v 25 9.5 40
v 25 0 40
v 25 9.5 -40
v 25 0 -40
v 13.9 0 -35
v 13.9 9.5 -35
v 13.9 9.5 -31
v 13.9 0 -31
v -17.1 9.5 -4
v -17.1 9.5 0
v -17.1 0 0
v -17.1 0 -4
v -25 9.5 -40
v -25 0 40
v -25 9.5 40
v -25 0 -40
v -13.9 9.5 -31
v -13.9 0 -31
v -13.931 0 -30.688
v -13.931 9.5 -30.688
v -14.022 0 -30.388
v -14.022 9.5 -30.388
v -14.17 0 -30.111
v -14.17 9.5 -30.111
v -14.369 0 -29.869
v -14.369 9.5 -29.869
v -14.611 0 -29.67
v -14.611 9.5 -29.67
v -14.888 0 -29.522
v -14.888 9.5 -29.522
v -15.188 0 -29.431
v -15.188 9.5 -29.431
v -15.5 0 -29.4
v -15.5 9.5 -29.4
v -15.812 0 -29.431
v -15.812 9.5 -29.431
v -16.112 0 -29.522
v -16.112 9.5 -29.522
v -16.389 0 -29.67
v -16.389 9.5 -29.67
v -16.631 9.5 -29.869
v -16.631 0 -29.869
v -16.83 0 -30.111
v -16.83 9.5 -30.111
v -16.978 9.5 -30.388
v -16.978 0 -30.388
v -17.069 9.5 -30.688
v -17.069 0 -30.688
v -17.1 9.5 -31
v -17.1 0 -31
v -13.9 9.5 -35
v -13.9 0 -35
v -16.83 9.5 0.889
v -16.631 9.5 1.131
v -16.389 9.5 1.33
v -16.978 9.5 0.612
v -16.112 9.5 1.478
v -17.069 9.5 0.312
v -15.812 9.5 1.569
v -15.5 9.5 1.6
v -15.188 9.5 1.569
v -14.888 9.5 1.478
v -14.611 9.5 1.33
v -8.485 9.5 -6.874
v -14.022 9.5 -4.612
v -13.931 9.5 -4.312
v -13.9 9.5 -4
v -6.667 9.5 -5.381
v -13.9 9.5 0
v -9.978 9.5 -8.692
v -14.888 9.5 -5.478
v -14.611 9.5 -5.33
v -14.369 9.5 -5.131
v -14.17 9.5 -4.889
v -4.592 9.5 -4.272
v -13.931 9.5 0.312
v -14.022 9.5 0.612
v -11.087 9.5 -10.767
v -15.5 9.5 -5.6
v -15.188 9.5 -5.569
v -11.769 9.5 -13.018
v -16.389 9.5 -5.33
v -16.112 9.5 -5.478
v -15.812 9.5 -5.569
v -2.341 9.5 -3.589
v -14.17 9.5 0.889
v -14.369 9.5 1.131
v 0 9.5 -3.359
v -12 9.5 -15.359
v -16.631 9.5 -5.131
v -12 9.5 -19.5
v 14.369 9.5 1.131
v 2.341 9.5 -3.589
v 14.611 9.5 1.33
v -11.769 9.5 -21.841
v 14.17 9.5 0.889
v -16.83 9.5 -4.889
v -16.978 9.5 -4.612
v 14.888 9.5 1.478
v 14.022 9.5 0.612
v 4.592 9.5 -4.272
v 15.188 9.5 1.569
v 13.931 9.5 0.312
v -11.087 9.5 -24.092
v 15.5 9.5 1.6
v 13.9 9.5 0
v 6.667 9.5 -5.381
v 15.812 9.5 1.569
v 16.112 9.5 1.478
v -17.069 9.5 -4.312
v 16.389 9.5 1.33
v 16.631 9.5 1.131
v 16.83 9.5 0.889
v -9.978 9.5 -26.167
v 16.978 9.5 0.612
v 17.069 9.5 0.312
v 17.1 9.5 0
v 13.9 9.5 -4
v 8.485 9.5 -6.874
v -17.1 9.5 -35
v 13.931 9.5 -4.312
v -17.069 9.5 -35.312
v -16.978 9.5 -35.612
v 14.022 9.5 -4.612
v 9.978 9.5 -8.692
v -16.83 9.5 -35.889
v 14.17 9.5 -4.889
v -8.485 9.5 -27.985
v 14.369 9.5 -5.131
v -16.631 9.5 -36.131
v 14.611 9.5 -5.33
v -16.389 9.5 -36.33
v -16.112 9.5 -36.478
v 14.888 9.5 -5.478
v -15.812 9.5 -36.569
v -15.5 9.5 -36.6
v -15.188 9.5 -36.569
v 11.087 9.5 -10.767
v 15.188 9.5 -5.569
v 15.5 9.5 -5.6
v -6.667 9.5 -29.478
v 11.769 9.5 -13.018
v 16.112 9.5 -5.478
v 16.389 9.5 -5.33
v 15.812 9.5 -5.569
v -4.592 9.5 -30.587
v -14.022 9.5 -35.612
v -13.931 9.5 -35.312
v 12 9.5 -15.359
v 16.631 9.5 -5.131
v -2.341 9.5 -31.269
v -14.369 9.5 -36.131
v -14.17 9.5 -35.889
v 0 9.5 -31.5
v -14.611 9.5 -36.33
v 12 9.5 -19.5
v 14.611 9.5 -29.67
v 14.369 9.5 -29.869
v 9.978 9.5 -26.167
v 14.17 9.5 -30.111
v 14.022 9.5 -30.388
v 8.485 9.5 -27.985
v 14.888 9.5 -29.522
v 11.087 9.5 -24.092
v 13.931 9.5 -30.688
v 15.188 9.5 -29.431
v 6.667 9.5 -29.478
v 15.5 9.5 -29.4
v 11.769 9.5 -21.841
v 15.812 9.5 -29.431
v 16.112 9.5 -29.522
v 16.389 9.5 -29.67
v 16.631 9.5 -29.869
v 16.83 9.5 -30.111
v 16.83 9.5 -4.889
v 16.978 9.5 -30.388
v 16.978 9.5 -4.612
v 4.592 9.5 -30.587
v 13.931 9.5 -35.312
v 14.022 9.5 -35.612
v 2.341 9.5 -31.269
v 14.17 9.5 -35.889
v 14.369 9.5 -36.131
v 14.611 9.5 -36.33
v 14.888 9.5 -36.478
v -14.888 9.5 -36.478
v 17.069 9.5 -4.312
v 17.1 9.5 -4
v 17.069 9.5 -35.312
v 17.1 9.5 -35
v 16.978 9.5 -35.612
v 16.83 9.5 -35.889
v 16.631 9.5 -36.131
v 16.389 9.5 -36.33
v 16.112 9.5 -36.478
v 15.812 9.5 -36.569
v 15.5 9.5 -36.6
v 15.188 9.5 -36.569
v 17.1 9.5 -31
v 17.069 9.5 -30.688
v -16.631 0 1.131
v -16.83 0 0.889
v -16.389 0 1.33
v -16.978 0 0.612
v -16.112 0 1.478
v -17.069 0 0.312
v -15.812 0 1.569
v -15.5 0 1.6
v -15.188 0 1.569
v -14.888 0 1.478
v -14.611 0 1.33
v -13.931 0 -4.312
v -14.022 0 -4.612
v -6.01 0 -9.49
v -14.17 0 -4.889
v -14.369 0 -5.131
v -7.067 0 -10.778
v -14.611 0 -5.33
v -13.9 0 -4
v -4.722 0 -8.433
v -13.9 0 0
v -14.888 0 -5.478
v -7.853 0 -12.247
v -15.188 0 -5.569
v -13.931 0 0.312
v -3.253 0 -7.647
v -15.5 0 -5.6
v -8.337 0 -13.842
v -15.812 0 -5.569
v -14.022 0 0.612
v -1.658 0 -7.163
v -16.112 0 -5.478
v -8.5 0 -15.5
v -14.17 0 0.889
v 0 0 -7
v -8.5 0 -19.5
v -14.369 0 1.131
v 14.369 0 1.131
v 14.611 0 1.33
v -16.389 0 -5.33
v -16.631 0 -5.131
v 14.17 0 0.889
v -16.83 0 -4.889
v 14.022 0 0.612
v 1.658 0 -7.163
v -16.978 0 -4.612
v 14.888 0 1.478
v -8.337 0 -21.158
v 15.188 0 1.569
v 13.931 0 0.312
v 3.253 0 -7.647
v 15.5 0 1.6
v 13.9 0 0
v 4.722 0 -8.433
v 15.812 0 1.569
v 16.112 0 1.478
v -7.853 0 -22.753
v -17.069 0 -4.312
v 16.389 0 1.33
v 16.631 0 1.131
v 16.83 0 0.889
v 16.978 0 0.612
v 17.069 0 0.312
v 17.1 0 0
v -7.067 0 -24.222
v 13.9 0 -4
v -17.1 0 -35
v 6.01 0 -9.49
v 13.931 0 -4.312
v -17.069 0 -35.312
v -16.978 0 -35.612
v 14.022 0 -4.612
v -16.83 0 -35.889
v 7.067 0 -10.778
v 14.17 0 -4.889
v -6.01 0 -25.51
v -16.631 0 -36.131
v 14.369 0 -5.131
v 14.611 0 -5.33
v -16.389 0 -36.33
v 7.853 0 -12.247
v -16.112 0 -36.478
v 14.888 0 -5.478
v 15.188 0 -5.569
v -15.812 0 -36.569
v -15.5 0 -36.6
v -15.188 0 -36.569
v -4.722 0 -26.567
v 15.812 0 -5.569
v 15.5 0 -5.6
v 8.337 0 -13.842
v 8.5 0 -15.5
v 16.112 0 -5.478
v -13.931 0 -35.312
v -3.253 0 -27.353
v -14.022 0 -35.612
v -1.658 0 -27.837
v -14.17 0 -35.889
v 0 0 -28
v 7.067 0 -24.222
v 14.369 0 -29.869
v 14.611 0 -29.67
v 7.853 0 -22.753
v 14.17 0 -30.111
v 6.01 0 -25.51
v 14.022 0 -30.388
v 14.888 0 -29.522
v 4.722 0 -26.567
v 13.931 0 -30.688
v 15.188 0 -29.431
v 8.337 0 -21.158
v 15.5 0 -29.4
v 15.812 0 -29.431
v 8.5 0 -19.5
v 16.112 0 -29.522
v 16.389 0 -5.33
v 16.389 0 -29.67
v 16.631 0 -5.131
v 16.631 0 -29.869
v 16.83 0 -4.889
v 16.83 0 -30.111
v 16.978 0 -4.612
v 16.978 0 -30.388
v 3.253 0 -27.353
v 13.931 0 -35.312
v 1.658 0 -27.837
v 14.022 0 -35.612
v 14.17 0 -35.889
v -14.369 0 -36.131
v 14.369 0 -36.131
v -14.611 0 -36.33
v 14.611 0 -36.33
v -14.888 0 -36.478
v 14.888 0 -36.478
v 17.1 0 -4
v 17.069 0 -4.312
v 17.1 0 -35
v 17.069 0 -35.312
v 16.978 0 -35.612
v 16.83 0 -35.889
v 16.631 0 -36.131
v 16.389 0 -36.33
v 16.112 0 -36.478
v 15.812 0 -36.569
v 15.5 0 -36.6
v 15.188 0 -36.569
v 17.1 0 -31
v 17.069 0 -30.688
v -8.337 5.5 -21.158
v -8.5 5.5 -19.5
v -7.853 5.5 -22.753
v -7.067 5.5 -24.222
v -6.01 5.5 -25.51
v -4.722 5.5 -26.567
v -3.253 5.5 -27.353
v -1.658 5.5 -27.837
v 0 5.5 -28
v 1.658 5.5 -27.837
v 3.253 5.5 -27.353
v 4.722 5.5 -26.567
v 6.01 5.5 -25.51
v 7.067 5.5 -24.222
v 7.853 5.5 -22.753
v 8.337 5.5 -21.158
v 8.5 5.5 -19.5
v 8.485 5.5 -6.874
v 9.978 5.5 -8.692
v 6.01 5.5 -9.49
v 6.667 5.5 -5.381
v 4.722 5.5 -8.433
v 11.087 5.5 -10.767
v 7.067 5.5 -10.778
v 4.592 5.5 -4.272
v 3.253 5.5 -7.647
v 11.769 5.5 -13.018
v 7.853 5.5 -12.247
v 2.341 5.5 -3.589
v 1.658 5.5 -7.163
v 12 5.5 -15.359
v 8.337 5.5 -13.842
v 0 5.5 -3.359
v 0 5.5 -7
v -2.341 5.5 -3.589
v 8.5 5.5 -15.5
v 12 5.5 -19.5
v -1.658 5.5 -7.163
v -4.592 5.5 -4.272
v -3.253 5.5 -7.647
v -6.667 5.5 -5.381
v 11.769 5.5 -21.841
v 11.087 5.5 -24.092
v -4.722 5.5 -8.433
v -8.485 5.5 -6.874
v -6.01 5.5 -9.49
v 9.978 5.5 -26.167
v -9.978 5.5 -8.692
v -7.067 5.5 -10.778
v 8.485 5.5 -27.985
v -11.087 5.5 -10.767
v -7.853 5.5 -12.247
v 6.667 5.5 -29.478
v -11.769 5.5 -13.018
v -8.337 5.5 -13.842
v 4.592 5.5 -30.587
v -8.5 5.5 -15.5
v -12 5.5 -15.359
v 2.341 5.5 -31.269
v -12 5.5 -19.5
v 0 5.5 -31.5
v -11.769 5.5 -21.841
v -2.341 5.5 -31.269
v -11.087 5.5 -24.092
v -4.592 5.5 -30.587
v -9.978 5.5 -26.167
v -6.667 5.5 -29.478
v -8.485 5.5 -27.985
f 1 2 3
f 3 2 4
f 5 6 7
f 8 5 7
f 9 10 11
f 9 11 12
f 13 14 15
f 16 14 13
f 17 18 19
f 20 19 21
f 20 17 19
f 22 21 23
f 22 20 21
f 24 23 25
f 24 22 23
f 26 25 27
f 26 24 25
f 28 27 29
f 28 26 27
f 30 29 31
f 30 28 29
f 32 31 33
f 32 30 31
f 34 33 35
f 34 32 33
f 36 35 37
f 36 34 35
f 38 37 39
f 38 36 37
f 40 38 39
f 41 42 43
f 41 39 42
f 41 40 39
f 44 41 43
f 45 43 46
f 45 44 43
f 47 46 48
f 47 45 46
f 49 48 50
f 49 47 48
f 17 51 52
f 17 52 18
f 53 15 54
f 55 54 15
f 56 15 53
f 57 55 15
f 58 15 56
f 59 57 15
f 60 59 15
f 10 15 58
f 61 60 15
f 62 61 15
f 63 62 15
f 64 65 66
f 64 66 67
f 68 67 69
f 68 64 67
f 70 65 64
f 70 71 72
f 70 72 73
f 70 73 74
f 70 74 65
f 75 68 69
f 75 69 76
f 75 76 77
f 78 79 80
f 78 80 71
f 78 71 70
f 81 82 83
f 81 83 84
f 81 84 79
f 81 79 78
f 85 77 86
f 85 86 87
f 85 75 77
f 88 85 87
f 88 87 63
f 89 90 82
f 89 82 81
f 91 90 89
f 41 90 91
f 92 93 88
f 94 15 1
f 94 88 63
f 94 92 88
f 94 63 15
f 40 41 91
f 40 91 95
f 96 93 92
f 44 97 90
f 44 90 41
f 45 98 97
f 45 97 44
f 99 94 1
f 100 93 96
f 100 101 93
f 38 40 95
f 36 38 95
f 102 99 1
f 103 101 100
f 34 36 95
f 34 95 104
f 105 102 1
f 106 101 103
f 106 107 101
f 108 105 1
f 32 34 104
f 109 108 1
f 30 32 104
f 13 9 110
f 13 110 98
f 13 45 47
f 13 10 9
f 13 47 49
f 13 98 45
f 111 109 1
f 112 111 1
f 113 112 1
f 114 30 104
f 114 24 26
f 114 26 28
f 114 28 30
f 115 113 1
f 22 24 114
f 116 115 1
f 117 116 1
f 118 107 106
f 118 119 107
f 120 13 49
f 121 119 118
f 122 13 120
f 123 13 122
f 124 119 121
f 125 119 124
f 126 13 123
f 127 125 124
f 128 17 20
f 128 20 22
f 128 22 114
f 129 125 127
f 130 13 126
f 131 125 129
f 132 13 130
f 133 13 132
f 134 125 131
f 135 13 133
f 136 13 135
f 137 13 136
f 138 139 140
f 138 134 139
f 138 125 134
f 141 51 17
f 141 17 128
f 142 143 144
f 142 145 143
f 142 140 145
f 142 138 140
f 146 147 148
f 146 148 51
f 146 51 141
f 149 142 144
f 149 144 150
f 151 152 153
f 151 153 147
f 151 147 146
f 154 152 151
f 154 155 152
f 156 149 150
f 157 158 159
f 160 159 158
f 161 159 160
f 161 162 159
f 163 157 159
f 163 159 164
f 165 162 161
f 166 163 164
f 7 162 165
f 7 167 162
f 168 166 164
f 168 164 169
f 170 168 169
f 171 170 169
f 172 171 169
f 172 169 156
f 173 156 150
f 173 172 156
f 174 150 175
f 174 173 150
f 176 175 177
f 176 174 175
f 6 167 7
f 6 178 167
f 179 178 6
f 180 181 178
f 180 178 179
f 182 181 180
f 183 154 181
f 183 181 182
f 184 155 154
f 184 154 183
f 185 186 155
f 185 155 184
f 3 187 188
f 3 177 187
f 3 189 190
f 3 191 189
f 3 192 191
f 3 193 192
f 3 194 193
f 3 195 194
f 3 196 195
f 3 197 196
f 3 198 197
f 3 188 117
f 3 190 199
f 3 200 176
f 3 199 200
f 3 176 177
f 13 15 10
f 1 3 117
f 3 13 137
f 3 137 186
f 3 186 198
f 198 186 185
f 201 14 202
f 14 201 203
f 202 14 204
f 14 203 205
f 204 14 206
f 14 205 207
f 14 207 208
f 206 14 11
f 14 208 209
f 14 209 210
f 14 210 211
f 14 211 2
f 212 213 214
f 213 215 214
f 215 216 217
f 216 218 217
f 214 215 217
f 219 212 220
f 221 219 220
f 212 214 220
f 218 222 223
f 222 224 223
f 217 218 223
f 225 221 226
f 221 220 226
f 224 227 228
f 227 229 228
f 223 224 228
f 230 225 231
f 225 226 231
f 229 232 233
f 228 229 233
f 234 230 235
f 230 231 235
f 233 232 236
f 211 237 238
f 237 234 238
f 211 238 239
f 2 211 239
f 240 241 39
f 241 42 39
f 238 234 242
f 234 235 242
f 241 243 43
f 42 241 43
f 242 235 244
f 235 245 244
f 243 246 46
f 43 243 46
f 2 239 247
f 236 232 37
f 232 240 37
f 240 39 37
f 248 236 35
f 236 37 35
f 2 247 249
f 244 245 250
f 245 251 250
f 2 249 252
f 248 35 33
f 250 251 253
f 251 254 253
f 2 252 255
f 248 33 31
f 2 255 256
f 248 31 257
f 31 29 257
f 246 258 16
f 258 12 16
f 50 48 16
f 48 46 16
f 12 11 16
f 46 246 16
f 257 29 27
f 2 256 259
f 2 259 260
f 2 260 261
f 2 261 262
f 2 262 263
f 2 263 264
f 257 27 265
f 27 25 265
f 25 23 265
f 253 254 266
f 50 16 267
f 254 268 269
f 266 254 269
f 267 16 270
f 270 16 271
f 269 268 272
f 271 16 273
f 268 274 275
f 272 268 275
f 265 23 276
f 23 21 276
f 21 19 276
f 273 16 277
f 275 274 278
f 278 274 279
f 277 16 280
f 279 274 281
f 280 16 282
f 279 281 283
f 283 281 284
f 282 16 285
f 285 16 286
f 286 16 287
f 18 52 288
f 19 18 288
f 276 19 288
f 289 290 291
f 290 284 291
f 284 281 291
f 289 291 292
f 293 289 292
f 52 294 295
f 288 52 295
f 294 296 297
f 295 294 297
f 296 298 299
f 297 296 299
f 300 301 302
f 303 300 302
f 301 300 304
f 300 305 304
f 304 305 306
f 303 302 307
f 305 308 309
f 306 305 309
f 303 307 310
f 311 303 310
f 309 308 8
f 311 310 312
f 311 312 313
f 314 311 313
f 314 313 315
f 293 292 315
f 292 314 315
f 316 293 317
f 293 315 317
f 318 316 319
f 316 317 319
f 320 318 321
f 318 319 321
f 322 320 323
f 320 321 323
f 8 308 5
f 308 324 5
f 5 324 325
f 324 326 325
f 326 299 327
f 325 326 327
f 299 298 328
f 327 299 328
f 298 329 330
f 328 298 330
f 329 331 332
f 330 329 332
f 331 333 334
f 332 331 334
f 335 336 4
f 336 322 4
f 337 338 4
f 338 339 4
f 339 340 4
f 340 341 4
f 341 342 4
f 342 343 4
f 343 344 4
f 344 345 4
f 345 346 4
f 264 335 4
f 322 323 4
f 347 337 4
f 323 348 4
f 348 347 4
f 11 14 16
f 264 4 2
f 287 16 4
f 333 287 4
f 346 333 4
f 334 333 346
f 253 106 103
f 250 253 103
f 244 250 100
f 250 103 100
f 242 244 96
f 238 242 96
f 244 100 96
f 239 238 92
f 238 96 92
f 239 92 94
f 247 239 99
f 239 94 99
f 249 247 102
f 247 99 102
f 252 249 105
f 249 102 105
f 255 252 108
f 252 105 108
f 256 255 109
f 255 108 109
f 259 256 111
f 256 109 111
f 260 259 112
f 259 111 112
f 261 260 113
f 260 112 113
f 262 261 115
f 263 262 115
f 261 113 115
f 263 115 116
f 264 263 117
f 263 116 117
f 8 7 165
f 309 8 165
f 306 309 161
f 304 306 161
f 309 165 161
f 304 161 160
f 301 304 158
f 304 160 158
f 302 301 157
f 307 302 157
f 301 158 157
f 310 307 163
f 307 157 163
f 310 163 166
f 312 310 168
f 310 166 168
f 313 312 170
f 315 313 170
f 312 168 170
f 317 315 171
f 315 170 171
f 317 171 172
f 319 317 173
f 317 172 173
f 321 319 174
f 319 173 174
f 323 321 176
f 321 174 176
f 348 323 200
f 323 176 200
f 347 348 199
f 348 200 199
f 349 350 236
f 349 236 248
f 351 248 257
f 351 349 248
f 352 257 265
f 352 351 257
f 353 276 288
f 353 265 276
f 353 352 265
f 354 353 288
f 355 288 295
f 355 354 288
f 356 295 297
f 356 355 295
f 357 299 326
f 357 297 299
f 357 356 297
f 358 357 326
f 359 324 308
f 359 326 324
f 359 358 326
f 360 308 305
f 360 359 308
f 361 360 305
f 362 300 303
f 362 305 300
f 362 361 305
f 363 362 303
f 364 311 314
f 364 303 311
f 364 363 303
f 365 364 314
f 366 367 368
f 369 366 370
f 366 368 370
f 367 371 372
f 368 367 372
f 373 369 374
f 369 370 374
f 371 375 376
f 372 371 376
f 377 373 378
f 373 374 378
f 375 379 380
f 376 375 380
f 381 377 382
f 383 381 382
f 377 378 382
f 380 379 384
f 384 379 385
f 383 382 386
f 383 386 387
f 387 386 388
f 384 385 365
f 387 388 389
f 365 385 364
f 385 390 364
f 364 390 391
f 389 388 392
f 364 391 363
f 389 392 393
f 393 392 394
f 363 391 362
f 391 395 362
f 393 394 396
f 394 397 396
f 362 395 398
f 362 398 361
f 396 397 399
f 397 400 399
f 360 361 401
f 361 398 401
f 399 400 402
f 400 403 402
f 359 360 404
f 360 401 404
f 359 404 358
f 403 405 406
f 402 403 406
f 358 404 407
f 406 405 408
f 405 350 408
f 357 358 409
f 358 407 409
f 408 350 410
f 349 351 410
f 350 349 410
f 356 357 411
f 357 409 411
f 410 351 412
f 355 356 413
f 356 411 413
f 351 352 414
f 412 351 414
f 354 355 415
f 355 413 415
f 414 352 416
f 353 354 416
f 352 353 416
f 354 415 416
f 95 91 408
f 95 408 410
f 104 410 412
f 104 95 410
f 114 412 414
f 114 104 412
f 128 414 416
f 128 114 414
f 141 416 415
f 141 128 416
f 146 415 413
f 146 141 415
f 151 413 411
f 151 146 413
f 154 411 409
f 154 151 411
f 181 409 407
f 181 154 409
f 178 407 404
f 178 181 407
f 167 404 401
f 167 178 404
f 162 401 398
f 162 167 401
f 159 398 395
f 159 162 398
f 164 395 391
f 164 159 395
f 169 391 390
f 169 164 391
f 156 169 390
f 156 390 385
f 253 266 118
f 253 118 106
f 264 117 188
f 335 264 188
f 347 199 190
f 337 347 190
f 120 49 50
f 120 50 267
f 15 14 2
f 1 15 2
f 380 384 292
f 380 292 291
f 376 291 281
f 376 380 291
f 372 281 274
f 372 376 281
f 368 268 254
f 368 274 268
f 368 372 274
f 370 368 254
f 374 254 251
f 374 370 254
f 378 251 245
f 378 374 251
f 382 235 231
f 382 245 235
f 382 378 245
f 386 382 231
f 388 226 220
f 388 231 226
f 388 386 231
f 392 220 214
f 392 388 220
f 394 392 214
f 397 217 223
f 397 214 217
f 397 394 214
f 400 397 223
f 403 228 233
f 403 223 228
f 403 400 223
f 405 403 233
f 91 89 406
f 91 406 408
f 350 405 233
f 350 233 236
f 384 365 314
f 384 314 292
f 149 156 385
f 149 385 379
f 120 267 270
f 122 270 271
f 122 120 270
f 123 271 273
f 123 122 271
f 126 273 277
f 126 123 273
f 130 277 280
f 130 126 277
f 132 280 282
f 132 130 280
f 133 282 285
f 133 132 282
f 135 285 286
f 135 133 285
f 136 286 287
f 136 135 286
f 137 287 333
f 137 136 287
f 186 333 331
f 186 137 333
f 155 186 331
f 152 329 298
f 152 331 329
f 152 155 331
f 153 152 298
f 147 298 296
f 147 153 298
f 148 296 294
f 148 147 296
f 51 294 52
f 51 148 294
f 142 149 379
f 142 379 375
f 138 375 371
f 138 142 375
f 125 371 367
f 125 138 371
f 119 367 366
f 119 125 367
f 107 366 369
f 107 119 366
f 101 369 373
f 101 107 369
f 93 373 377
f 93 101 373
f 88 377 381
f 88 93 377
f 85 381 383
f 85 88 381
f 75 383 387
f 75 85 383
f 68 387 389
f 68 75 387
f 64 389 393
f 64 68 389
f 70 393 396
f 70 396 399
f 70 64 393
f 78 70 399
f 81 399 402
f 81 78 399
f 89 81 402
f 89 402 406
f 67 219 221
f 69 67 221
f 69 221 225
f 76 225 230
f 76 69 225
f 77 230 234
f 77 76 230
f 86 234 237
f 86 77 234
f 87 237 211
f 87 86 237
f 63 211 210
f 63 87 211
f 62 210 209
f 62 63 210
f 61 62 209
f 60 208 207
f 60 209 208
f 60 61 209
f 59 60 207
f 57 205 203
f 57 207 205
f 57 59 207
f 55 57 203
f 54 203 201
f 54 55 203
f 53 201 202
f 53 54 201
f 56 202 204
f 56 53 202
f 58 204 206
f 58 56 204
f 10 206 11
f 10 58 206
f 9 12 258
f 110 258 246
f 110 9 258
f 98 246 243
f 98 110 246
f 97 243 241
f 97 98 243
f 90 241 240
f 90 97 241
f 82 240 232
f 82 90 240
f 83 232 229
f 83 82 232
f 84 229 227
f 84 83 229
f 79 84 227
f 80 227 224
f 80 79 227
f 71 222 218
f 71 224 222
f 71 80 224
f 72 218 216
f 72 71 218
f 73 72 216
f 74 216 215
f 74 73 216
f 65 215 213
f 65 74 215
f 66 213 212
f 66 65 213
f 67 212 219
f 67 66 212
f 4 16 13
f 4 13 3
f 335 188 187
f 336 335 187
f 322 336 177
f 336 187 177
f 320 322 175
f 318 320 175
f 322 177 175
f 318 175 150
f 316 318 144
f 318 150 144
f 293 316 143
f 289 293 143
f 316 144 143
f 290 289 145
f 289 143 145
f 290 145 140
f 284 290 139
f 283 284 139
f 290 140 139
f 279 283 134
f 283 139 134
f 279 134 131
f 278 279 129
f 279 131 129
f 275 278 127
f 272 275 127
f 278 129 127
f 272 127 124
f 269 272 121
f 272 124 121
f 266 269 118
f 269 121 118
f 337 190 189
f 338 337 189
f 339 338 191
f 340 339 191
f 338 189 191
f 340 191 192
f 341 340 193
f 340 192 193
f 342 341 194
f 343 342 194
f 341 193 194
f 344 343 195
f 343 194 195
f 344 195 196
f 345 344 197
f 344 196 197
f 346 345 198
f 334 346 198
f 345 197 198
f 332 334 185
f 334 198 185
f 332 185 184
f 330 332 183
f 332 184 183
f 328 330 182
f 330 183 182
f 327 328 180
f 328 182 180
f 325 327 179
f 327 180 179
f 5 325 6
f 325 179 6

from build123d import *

# Parameters (mm, degrees)
SKETCH1_W           = 50
SKETCH1_H           = 80
BOSS_EXTRUDE1_DEPTH = 9.5
CUT_EXTRUDE1_DEPTH  = 10.5
CUT_EXTRUDE2_DEPTH  = 4


with BuildPart() as part:
    # Sketch1 → Boss-Extrude1 (new body)
    with BuildSketch(Plane(origin=(0, 0, 0), x_dir=(1, 0, 0), z_dir=(0, 1, 0))):
        Rectangle(SKETCH1_W, SKETCH1_H)
    extrude(amount=BOSS_EXTRUDE1_DEPTH)

    # Sketch2 → Cut-Extrude1 (cut, through all)
    with BuildSketch(Plane(origin=(0, 9.5, 0), x_dir=(1, 0, 0), z_dir=(0, 1, 0))):
        with BuildLine():
            Line((-13.9, 35), (-13.9, 31))
            ThreePointArc((-13.9, 31), (-15.5, 29.4), (-17.1, 31))
            Line((-17.1, 31), (-17.1, 35))
            ThreePointArc((-17.1, 35), (-15.5, 36.6), (-13.9, 35))
        make_face()
        with BuildLine():
            Line((13.9, 35), (13.9, 31))
            ThreePointArc((13.9, 31), (15.5, 29.4), (17.1, 31))
            Line((17.1, 31), (17.1, 35))
            ThreePointArc((17.1, 35), (15.5, 36.6), (13.9, 35))
        make_face()
        with BuildLine():
            Line((-13.9, 4), (-13.9, 0))
            ThreePointArc((-13.9, 0), (-15.5, -1.6), (-17.1, 0))
            Line((-17.1, 0), (-17.1, 4))
            ThreePointArc((-17.1, 4), (-15.5, 5.6), (-13.9, 4))
        make_face()
        with BuildLine():
            Line((13.9, 4), (13.9, 0))
            ThreePointArc((13.9, 0), (15.5, -1.6), (17.1, 0))
            Line((17.1, 0), (17.1, 4))
            ThreePointArc((17.1, 4), (15.5, 5.6), (13.9, 4))
        make_face()
        with BuildLine():
            Line((8.5, 19.5), (8.5, 15.5))
            ThreePointArc((8.5, 15.5), (0, 7), (-8.5, 15.5))
            Line((-8.5, 15.5), (-8.5, 19.5))
            ThreePointArc((-8.5, 19.5), (0, 28), (8.5, 19.5))
        make_face()
    extrude(amount=-CUT_EXTRUDE1_DEPTH, mode=Mode.SUBTRACT)

    # Sketch3 → Cut-Extrude2 (cut)
    with BuildSketch(Plane(origin=(0, 9.5, 0), x_dir=(1, 0, 0), z_dir=(0, 1, 0))):
        with BuildLine():
            Line((12, 19.5), (12, 15.358826141))
            ThreePointArc((12, 15.358826141), (0, 3.358826141), (-12, 15.358826141))
            Line((-12, 15.358826141), (-12, 19.5))
            ThreePointArc((-12, 19.5), (0, 31.5), (12, 19.5))
        make_face()
    extrude(amount=-CUT_EXTRUDE2_DEPTH, mode=Mode.SUBTRACT)


solid = part.part
